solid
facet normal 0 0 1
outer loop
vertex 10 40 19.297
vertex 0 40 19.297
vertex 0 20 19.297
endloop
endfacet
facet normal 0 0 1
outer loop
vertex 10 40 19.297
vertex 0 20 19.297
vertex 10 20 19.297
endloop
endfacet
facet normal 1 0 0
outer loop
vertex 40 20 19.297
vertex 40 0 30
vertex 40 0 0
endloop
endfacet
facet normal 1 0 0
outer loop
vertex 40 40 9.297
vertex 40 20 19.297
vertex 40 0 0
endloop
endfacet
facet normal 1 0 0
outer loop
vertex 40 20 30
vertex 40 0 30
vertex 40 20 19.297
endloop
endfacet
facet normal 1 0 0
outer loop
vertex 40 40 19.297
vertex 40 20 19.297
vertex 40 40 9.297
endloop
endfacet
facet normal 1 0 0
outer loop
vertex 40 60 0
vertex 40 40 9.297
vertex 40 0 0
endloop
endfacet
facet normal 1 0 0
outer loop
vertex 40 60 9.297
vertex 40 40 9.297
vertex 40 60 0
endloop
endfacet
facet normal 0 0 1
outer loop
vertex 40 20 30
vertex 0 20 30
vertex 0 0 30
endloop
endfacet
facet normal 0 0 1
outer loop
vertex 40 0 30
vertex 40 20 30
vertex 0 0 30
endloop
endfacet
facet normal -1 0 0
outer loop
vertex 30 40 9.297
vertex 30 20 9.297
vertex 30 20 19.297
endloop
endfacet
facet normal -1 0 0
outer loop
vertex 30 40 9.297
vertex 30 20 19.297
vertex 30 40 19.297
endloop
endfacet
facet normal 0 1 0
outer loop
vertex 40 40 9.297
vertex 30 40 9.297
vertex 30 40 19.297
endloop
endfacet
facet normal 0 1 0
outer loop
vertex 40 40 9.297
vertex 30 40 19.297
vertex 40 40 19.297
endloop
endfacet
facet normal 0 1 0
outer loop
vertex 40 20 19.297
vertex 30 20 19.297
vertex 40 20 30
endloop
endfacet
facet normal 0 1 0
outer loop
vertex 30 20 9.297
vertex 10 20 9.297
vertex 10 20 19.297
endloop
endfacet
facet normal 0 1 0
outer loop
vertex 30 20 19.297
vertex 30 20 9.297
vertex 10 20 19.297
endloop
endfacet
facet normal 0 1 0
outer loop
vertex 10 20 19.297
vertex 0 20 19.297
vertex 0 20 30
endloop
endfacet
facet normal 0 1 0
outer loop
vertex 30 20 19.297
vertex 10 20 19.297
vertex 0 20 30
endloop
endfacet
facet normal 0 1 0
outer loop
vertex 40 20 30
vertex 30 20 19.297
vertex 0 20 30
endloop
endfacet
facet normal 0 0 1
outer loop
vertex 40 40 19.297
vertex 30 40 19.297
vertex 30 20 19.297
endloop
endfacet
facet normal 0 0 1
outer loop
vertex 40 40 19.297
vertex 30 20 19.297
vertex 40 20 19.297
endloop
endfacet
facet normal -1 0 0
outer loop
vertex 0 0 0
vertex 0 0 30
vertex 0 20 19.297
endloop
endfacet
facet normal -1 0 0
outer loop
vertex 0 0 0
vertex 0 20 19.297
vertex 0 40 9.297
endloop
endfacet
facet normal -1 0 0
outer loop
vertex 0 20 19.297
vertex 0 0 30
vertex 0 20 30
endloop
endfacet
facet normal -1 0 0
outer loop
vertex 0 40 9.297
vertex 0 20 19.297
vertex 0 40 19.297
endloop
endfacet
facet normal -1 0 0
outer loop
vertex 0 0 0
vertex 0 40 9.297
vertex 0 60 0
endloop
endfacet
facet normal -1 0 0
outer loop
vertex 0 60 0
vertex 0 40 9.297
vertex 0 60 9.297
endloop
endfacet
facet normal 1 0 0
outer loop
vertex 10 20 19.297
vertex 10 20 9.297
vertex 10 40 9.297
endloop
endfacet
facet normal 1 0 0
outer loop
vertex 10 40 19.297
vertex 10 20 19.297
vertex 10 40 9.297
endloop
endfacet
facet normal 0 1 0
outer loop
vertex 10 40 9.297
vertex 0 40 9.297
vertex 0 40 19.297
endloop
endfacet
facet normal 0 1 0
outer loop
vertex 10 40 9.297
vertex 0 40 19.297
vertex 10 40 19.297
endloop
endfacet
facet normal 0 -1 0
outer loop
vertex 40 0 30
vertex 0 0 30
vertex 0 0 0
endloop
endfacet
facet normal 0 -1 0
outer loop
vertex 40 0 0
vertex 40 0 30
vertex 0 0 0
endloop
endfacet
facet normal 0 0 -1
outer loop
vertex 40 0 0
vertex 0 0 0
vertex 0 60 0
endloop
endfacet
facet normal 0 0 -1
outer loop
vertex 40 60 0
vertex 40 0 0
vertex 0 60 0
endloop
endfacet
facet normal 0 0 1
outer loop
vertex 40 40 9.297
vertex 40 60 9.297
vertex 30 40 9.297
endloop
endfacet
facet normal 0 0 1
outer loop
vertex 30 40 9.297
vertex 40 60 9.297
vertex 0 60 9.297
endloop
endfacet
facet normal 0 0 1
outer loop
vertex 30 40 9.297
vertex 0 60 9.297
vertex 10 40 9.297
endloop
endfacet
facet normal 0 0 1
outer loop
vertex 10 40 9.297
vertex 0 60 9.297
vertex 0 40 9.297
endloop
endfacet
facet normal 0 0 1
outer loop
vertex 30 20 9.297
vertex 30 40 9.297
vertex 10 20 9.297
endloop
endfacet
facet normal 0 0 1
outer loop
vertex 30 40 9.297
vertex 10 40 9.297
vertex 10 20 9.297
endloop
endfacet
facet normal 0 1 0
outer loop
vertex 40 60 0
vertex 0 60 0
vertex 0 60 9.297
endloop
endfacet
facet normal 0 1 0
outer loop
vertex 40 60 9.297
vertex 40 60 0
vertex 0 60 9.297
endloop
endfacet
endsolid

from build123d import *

# Parameters (mm, degrees)
F1_DEPTH = 40
F2_W     = 10
F2_H     = 20
F3_DEPTH = 10


with BuildPart() as f1:
    # F0 (on Right) → F1 (new body)
    with BuildSketch(Plane.YZ):
        Polygon((0, 30), (0, 0), (60, 0), (60, 9.296588), (50, 9.296588), (20, 9.296588), (20, 30), align=None)
    extrude(amount=F1_DEPTH)

    # F2 (on face) → F3 (join)
    with BuildSketch(Plane.XY.offset(9.296588)):
        with Locations((35, 30)):
            Rectangle(F2_W, F2_H)
        with Locations((5, 30)):
            Rectangle(F2_W, F2_H)
    extrude(amount=F3_DEPTH)


solid = f1.part
